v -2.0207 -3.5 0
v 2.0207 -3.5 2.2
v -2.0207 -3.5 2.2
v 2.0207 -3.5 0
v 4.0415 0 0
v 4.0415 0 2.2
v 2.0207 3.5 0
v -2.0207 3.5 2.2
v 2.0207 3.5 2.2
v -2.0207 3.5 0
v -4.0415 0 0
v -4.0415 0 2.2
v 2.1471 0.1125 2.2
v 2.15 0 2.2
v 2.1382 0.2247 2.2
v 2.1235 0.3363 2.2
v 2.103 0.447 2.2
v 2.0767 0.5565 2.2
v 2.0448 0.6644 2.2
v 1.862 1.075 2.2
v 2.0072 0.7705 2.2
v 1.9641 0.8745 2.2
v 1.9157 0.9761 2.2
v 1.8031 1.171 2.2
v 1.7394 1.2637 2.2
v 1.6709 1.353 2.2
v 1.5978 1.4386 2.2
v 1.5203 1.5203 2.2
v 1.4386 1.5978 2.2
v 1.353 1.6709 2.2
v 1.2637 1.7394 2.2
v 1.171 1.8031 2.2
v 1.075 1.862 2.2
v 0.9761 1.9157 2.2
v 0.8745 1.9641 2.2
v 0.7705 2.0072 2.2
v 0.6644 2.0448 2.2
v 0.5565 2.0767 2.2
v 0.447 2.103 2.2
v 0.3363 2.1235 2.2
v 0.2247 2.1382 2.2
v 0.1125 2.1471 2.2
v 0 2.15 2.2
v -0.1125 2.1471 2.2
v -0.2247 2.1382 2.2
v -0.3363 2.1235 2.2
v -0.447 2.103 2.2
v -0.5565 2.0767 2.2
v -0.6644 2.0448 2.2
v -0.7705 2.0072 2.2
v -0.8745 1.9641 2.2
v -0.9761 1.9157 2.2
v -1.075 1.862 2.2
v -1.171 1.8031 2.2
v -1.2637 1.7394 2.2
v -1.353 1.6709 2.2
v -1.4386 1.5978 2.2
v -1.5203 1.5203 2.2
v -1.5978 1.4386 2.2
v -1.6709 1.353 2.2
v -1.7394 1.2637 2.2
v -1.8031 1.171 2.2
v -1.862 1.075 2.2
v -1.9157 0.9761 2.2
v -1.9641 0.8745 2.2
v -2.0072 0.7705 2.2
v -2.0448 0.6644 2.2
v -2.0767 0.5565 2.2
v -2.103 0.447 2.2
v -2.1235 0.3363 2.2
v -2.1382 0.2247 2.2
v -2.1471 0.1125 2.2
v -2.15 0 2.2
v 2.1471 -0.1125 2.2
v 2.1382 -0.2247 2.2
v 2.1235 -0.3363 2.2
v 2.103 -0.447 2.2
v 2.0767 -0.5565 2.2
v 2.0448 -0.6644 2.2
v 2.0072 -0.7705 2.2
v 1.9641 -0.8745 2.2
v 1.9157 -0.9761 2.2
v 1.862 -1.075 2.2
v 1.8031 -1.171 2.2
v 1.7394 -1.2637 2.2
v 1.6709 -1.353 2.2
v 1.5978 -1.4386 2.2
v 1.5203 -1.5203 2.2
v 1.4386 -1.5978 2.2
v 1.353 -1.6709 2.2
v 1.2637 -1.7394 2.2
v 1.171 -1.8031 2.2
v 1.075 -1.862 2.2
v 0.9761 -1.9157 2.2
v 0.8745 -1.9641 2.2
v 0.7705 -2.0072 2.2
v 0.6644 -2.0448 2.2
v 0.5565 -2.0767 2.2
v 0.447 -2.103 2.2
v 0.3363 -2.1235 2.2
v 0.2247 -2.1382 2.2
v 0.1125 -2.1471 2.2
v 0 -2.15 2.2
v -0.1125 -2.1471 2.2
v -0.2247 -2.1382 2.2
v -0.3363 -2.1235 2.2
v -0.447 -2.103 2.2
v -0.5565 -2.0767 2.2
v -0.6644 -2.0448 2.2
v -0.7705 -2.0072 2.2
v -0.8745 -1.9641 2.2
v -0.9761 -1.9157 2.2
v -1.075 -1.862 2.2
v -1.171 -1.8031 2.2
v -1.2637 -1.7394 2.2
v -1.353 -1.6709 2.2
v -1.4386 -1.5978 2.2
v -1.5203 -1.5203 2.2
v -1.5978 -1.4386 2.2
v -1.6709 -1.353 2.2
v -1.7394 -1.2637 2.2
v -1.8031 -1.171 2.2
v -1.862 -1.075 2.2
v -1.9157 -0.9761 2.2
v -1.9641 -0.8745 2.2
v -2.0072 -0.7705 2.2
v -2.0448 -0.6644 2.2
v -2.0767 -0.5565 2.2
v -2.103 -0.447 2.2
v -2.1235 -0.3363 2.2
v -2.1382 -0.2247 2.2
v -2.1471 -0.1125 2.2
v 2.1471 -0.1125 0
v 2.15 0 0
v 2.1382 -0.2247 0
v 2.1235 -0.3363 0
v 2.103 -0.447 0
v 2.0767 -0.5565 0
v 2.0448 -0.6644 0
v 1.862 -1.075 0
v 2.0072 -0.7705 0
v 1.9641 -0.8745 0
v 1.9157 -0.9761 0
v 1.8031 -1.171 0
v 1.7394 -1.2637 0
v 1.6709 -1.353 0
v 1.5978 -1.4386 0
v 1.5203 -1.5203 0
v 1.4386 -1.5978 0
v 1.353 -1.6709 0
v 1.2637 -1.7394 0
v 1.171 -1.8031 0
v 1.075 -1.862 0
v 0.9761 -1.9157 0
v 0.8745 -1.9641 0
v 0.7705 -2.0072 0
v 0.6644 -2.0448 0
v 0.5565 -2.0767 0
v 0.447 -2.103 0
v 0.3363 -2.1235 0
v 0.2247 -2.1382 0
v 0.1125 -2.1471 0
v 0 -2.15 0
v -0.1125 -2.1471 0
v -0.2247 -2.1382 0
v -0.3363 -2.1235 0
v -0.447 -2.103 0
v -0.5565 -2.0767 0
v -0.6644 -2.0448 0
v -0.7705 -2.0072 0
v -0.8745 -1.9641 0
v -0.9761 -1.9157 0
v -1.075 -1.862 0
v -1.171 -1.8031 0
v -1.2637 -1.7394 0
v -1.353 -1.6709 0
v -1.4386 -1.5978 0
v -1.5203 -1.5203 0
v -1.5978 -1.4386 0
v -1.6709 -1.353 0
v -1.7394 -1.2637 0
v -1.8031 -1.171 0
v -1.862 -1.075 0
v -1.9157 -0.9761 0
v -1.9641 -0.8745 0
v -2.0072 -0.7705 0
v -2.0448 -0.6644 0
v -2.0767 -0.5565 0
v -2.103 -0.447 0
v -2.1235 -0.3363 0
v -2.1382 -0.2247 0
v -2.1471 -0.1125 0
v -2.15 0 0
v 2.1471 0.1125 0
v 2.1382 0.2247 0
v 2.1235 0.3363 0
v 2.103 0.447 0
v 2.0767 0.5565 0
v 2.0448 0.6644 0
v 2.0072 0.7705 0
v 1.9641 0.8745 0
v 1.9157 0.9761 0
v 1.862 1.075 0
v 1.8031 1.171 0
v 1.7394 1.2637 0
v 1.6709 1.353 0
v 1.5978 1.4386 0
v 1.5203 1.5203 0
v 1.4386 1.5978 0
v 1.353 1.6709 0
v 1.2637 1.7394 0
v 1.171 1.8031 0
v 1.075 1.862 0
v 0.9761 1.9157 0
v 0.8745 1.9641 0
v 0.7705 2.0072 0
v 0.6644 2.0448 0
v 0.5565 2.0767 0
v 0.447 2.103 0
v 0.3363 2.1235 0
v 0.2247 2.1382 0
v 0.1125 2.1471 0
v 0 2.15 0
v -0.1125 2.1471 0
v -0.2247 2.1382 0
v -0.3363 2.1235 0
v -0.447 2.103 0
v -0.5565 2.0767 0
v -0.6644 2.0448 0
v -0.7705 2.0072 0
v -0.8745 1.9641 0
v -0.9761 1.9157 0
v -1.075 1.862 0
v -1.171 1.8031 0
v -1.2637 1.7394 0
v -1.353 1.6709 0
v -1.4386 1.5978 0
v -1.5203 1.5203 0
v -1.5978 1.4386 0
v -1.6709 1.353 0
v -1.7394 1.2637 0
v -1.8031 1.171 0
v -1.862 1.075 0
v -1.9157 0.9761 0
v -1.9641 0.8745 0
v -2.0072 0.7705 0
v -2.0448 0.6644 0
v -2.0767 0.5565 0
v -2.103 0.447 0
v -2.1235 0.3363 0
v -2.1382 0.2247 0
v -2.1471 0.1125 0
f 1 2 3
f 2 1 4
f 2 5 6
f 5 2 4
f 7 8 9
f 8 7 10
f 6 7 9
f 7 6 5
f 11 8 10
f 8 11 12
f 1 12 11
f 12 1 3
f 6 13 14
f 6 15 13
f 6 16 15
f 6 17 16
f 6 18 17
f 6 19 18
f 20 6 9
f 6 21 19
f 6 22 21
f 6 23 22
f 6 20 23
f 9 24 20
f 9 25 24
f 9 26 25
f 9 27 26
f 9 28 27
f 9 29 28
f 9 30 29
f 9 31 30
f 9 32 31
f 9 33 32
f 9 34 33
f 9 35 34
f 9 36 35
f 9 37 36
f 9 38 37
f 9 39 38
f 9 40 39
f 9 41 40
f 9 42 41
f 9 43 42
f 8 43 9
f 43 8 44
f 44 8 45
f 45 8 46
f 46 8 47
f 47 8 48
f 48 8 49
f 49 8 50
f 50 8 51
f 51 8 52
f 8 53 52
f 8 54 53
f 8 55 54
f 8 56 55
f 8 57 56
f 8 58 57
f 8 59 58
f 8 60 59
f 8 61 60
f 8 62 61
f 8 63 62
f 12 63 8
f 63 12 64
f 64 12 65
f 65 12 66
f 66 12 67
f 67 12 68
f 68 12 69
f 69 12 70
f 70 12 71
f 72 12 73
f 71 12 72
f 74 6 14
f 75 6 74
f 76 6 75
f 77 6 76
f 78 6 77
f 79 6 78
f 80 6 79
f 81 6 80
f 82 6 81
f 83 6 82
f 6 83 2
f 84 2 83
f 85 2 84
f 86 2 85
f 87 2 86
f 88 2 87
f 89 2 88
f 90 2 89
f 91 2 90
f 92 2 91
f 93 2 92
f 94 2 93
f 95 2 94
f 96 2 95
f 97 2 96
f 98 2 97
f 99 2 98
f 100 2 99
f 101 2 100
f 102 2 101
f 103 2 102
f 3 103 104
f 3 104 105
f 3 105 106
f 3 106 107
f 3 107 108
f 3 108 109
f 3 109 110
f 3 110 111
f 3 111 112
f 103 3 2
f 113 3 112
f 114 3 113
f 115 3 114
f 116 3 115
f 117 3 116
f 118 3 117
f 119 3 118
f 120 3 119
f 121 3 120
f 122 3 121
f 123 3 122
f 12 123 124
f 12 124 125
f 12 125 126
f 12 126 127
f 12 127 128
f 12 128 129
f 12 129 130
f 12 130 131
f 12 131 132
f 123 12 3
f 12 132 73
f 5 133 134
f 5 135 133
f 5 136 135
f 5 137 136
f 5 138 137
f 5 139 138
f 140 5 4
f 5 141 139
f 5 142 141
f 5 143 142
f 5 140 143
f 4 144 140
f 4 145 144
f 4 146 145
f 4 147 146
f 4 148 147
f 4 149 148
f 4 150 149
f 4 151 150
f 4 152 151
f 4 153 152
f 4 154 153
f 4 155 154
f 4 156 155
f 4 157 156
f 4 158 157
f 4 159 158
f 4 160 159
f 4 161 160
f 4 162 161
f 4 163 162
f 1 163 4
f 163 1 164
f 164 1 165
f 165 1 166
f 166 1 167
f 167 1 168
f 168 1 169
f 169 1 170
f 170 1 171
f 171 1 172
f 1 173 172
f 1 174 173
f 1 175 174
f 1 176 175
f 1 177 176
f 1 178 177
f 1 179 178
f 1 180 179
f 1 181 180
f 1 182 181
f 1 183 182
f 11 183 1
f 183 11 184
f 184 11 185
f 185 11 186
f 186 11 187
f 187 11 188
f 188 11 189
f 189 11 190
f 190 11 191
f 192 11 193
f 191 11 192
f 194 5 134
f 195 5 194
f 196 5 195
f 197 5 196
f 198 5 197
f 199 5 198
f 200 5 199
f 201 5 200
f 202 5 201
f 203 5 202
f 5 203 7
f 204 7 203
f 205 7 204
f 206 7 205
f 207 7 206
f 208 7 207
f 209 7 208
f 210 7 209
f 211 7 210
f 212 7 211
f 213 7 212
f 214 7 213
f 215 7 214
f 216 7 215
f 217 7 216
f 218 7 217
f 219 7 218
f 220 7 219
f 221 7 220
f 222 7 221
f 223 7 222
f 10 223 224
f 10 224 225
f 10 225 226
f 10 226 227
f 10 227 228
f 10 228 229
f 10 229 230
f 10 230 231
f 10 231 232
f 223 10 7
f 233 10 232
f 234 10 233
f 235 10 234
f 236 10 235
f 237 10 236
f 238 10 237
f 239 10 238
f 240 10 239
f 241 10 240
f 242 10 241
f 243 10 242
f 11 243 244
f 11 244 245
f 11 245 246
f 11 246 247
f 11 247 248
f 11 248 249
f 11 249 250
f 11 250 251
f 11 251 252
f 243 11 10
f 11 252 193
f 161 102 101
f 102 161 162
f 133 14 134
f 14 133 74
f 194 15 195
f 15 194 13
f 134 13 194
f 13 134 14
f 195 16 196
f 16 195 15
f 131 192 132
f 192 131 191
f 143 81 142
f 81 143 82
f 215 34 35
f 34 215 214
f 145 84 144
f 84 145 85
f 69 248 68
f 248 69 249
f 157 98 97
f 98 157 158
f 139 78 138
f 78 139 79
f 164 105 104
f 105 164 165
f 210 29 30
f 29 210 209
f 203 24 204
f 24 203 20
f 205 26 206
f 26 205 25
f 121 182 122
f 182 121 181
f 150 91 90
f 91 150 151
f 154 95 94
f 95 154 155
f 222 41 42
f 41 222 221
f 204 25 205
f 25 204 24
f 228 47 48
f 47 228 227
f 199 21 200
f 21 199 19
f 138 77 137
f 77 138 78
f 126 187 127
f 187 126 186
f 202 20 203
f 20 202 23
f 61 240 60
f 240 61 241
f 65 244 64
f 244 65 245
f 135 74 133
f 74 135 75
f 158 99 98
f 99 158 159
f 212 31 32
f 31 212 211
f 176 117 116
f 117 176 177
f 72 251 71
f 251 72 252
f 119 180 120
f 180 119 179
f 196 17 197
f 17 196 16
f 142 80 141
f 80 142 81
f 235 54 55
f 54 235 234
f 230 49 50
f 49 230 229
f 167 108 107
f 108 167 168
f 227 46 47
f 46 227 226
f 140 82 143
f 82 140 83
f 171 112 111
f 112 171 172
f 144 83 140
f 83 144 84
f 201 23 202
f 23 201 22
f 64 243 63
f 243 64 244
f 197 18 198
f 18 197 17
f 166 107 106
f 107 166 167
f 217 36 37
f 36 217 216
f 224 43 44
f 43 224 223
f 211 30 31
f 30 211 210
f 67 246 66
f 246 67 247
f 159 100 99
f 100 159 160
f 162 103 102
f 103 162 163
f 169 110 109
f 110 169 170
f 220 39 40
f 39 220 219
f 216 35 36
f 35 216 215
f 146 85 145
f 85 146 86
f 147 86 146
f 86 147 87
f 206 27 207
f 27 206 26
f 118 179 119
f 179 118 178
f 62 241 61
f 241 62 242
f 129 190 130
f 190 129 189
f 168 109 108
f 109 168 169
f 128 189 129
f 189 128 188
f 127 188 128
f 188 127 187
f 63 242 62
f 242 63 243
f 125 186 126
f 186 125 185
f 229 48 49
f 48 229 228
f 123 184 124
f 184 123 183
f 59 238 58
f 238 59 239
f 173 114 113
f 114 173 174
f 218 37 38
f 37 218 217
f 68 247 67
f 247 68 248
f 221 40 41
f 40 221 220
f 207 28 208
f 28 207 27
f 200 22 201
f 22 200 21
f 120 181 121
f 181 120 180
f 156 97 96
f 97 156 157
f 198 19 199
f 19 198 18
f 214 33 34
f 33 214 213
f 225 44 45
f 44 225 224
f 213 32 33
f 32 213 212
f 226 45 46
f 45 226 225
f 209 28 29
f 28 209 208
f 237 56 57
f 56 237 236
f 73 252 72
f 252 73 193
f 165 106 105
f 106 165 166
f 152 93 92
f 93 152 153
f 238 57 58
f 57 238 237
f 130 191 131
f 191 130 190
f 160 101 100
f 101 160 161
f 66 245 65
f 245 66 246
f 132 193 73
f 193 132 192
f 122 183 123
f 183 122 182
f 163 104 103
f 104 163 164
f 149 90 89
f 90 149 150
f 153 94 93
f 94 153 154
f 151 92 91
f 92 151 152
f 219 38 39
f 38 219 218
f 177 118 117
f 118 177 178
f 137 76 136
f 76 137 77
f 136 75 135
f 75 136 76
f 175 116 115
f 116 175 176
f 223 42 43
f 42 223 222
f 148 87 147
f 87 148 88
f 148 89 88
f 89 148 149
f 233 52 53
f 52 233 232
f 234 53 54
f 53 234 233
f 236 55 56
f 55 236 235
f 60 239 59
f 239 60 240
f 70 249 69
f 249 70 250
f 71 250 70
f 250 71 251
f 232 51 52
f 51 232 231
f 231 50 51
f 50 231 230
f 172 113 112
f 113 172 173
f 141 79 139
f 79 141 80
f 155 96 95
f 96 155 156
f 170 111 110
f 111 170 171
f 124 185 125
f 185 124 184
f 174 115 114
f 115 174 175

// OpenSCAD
$fn = 120;

across_flats = 7.0;      // mm
thickness    = 2.2;      // mm
screw_d      = 4.0;      // mm (nominal)
clearance    = 0.3;      // mm added to screw diameter for through-hole

module hex_prism_af(af, h) {
    // For a regular hexagon: across_flats = 2 * apothem
    // Circumradius R = apothem / cos(30°) = (af/2) / cos(30°)
    R = (af/2) / cos(30);
    cylinder(h = h, r = R, $fn = 6);
}

difference() {
    hex_prism_af(across_flats, thickness);
    translate([0,0,-0.1])
        cylinder(h = thickness + 0.2, d = screw_d + clearance, $fn = 120);
}
